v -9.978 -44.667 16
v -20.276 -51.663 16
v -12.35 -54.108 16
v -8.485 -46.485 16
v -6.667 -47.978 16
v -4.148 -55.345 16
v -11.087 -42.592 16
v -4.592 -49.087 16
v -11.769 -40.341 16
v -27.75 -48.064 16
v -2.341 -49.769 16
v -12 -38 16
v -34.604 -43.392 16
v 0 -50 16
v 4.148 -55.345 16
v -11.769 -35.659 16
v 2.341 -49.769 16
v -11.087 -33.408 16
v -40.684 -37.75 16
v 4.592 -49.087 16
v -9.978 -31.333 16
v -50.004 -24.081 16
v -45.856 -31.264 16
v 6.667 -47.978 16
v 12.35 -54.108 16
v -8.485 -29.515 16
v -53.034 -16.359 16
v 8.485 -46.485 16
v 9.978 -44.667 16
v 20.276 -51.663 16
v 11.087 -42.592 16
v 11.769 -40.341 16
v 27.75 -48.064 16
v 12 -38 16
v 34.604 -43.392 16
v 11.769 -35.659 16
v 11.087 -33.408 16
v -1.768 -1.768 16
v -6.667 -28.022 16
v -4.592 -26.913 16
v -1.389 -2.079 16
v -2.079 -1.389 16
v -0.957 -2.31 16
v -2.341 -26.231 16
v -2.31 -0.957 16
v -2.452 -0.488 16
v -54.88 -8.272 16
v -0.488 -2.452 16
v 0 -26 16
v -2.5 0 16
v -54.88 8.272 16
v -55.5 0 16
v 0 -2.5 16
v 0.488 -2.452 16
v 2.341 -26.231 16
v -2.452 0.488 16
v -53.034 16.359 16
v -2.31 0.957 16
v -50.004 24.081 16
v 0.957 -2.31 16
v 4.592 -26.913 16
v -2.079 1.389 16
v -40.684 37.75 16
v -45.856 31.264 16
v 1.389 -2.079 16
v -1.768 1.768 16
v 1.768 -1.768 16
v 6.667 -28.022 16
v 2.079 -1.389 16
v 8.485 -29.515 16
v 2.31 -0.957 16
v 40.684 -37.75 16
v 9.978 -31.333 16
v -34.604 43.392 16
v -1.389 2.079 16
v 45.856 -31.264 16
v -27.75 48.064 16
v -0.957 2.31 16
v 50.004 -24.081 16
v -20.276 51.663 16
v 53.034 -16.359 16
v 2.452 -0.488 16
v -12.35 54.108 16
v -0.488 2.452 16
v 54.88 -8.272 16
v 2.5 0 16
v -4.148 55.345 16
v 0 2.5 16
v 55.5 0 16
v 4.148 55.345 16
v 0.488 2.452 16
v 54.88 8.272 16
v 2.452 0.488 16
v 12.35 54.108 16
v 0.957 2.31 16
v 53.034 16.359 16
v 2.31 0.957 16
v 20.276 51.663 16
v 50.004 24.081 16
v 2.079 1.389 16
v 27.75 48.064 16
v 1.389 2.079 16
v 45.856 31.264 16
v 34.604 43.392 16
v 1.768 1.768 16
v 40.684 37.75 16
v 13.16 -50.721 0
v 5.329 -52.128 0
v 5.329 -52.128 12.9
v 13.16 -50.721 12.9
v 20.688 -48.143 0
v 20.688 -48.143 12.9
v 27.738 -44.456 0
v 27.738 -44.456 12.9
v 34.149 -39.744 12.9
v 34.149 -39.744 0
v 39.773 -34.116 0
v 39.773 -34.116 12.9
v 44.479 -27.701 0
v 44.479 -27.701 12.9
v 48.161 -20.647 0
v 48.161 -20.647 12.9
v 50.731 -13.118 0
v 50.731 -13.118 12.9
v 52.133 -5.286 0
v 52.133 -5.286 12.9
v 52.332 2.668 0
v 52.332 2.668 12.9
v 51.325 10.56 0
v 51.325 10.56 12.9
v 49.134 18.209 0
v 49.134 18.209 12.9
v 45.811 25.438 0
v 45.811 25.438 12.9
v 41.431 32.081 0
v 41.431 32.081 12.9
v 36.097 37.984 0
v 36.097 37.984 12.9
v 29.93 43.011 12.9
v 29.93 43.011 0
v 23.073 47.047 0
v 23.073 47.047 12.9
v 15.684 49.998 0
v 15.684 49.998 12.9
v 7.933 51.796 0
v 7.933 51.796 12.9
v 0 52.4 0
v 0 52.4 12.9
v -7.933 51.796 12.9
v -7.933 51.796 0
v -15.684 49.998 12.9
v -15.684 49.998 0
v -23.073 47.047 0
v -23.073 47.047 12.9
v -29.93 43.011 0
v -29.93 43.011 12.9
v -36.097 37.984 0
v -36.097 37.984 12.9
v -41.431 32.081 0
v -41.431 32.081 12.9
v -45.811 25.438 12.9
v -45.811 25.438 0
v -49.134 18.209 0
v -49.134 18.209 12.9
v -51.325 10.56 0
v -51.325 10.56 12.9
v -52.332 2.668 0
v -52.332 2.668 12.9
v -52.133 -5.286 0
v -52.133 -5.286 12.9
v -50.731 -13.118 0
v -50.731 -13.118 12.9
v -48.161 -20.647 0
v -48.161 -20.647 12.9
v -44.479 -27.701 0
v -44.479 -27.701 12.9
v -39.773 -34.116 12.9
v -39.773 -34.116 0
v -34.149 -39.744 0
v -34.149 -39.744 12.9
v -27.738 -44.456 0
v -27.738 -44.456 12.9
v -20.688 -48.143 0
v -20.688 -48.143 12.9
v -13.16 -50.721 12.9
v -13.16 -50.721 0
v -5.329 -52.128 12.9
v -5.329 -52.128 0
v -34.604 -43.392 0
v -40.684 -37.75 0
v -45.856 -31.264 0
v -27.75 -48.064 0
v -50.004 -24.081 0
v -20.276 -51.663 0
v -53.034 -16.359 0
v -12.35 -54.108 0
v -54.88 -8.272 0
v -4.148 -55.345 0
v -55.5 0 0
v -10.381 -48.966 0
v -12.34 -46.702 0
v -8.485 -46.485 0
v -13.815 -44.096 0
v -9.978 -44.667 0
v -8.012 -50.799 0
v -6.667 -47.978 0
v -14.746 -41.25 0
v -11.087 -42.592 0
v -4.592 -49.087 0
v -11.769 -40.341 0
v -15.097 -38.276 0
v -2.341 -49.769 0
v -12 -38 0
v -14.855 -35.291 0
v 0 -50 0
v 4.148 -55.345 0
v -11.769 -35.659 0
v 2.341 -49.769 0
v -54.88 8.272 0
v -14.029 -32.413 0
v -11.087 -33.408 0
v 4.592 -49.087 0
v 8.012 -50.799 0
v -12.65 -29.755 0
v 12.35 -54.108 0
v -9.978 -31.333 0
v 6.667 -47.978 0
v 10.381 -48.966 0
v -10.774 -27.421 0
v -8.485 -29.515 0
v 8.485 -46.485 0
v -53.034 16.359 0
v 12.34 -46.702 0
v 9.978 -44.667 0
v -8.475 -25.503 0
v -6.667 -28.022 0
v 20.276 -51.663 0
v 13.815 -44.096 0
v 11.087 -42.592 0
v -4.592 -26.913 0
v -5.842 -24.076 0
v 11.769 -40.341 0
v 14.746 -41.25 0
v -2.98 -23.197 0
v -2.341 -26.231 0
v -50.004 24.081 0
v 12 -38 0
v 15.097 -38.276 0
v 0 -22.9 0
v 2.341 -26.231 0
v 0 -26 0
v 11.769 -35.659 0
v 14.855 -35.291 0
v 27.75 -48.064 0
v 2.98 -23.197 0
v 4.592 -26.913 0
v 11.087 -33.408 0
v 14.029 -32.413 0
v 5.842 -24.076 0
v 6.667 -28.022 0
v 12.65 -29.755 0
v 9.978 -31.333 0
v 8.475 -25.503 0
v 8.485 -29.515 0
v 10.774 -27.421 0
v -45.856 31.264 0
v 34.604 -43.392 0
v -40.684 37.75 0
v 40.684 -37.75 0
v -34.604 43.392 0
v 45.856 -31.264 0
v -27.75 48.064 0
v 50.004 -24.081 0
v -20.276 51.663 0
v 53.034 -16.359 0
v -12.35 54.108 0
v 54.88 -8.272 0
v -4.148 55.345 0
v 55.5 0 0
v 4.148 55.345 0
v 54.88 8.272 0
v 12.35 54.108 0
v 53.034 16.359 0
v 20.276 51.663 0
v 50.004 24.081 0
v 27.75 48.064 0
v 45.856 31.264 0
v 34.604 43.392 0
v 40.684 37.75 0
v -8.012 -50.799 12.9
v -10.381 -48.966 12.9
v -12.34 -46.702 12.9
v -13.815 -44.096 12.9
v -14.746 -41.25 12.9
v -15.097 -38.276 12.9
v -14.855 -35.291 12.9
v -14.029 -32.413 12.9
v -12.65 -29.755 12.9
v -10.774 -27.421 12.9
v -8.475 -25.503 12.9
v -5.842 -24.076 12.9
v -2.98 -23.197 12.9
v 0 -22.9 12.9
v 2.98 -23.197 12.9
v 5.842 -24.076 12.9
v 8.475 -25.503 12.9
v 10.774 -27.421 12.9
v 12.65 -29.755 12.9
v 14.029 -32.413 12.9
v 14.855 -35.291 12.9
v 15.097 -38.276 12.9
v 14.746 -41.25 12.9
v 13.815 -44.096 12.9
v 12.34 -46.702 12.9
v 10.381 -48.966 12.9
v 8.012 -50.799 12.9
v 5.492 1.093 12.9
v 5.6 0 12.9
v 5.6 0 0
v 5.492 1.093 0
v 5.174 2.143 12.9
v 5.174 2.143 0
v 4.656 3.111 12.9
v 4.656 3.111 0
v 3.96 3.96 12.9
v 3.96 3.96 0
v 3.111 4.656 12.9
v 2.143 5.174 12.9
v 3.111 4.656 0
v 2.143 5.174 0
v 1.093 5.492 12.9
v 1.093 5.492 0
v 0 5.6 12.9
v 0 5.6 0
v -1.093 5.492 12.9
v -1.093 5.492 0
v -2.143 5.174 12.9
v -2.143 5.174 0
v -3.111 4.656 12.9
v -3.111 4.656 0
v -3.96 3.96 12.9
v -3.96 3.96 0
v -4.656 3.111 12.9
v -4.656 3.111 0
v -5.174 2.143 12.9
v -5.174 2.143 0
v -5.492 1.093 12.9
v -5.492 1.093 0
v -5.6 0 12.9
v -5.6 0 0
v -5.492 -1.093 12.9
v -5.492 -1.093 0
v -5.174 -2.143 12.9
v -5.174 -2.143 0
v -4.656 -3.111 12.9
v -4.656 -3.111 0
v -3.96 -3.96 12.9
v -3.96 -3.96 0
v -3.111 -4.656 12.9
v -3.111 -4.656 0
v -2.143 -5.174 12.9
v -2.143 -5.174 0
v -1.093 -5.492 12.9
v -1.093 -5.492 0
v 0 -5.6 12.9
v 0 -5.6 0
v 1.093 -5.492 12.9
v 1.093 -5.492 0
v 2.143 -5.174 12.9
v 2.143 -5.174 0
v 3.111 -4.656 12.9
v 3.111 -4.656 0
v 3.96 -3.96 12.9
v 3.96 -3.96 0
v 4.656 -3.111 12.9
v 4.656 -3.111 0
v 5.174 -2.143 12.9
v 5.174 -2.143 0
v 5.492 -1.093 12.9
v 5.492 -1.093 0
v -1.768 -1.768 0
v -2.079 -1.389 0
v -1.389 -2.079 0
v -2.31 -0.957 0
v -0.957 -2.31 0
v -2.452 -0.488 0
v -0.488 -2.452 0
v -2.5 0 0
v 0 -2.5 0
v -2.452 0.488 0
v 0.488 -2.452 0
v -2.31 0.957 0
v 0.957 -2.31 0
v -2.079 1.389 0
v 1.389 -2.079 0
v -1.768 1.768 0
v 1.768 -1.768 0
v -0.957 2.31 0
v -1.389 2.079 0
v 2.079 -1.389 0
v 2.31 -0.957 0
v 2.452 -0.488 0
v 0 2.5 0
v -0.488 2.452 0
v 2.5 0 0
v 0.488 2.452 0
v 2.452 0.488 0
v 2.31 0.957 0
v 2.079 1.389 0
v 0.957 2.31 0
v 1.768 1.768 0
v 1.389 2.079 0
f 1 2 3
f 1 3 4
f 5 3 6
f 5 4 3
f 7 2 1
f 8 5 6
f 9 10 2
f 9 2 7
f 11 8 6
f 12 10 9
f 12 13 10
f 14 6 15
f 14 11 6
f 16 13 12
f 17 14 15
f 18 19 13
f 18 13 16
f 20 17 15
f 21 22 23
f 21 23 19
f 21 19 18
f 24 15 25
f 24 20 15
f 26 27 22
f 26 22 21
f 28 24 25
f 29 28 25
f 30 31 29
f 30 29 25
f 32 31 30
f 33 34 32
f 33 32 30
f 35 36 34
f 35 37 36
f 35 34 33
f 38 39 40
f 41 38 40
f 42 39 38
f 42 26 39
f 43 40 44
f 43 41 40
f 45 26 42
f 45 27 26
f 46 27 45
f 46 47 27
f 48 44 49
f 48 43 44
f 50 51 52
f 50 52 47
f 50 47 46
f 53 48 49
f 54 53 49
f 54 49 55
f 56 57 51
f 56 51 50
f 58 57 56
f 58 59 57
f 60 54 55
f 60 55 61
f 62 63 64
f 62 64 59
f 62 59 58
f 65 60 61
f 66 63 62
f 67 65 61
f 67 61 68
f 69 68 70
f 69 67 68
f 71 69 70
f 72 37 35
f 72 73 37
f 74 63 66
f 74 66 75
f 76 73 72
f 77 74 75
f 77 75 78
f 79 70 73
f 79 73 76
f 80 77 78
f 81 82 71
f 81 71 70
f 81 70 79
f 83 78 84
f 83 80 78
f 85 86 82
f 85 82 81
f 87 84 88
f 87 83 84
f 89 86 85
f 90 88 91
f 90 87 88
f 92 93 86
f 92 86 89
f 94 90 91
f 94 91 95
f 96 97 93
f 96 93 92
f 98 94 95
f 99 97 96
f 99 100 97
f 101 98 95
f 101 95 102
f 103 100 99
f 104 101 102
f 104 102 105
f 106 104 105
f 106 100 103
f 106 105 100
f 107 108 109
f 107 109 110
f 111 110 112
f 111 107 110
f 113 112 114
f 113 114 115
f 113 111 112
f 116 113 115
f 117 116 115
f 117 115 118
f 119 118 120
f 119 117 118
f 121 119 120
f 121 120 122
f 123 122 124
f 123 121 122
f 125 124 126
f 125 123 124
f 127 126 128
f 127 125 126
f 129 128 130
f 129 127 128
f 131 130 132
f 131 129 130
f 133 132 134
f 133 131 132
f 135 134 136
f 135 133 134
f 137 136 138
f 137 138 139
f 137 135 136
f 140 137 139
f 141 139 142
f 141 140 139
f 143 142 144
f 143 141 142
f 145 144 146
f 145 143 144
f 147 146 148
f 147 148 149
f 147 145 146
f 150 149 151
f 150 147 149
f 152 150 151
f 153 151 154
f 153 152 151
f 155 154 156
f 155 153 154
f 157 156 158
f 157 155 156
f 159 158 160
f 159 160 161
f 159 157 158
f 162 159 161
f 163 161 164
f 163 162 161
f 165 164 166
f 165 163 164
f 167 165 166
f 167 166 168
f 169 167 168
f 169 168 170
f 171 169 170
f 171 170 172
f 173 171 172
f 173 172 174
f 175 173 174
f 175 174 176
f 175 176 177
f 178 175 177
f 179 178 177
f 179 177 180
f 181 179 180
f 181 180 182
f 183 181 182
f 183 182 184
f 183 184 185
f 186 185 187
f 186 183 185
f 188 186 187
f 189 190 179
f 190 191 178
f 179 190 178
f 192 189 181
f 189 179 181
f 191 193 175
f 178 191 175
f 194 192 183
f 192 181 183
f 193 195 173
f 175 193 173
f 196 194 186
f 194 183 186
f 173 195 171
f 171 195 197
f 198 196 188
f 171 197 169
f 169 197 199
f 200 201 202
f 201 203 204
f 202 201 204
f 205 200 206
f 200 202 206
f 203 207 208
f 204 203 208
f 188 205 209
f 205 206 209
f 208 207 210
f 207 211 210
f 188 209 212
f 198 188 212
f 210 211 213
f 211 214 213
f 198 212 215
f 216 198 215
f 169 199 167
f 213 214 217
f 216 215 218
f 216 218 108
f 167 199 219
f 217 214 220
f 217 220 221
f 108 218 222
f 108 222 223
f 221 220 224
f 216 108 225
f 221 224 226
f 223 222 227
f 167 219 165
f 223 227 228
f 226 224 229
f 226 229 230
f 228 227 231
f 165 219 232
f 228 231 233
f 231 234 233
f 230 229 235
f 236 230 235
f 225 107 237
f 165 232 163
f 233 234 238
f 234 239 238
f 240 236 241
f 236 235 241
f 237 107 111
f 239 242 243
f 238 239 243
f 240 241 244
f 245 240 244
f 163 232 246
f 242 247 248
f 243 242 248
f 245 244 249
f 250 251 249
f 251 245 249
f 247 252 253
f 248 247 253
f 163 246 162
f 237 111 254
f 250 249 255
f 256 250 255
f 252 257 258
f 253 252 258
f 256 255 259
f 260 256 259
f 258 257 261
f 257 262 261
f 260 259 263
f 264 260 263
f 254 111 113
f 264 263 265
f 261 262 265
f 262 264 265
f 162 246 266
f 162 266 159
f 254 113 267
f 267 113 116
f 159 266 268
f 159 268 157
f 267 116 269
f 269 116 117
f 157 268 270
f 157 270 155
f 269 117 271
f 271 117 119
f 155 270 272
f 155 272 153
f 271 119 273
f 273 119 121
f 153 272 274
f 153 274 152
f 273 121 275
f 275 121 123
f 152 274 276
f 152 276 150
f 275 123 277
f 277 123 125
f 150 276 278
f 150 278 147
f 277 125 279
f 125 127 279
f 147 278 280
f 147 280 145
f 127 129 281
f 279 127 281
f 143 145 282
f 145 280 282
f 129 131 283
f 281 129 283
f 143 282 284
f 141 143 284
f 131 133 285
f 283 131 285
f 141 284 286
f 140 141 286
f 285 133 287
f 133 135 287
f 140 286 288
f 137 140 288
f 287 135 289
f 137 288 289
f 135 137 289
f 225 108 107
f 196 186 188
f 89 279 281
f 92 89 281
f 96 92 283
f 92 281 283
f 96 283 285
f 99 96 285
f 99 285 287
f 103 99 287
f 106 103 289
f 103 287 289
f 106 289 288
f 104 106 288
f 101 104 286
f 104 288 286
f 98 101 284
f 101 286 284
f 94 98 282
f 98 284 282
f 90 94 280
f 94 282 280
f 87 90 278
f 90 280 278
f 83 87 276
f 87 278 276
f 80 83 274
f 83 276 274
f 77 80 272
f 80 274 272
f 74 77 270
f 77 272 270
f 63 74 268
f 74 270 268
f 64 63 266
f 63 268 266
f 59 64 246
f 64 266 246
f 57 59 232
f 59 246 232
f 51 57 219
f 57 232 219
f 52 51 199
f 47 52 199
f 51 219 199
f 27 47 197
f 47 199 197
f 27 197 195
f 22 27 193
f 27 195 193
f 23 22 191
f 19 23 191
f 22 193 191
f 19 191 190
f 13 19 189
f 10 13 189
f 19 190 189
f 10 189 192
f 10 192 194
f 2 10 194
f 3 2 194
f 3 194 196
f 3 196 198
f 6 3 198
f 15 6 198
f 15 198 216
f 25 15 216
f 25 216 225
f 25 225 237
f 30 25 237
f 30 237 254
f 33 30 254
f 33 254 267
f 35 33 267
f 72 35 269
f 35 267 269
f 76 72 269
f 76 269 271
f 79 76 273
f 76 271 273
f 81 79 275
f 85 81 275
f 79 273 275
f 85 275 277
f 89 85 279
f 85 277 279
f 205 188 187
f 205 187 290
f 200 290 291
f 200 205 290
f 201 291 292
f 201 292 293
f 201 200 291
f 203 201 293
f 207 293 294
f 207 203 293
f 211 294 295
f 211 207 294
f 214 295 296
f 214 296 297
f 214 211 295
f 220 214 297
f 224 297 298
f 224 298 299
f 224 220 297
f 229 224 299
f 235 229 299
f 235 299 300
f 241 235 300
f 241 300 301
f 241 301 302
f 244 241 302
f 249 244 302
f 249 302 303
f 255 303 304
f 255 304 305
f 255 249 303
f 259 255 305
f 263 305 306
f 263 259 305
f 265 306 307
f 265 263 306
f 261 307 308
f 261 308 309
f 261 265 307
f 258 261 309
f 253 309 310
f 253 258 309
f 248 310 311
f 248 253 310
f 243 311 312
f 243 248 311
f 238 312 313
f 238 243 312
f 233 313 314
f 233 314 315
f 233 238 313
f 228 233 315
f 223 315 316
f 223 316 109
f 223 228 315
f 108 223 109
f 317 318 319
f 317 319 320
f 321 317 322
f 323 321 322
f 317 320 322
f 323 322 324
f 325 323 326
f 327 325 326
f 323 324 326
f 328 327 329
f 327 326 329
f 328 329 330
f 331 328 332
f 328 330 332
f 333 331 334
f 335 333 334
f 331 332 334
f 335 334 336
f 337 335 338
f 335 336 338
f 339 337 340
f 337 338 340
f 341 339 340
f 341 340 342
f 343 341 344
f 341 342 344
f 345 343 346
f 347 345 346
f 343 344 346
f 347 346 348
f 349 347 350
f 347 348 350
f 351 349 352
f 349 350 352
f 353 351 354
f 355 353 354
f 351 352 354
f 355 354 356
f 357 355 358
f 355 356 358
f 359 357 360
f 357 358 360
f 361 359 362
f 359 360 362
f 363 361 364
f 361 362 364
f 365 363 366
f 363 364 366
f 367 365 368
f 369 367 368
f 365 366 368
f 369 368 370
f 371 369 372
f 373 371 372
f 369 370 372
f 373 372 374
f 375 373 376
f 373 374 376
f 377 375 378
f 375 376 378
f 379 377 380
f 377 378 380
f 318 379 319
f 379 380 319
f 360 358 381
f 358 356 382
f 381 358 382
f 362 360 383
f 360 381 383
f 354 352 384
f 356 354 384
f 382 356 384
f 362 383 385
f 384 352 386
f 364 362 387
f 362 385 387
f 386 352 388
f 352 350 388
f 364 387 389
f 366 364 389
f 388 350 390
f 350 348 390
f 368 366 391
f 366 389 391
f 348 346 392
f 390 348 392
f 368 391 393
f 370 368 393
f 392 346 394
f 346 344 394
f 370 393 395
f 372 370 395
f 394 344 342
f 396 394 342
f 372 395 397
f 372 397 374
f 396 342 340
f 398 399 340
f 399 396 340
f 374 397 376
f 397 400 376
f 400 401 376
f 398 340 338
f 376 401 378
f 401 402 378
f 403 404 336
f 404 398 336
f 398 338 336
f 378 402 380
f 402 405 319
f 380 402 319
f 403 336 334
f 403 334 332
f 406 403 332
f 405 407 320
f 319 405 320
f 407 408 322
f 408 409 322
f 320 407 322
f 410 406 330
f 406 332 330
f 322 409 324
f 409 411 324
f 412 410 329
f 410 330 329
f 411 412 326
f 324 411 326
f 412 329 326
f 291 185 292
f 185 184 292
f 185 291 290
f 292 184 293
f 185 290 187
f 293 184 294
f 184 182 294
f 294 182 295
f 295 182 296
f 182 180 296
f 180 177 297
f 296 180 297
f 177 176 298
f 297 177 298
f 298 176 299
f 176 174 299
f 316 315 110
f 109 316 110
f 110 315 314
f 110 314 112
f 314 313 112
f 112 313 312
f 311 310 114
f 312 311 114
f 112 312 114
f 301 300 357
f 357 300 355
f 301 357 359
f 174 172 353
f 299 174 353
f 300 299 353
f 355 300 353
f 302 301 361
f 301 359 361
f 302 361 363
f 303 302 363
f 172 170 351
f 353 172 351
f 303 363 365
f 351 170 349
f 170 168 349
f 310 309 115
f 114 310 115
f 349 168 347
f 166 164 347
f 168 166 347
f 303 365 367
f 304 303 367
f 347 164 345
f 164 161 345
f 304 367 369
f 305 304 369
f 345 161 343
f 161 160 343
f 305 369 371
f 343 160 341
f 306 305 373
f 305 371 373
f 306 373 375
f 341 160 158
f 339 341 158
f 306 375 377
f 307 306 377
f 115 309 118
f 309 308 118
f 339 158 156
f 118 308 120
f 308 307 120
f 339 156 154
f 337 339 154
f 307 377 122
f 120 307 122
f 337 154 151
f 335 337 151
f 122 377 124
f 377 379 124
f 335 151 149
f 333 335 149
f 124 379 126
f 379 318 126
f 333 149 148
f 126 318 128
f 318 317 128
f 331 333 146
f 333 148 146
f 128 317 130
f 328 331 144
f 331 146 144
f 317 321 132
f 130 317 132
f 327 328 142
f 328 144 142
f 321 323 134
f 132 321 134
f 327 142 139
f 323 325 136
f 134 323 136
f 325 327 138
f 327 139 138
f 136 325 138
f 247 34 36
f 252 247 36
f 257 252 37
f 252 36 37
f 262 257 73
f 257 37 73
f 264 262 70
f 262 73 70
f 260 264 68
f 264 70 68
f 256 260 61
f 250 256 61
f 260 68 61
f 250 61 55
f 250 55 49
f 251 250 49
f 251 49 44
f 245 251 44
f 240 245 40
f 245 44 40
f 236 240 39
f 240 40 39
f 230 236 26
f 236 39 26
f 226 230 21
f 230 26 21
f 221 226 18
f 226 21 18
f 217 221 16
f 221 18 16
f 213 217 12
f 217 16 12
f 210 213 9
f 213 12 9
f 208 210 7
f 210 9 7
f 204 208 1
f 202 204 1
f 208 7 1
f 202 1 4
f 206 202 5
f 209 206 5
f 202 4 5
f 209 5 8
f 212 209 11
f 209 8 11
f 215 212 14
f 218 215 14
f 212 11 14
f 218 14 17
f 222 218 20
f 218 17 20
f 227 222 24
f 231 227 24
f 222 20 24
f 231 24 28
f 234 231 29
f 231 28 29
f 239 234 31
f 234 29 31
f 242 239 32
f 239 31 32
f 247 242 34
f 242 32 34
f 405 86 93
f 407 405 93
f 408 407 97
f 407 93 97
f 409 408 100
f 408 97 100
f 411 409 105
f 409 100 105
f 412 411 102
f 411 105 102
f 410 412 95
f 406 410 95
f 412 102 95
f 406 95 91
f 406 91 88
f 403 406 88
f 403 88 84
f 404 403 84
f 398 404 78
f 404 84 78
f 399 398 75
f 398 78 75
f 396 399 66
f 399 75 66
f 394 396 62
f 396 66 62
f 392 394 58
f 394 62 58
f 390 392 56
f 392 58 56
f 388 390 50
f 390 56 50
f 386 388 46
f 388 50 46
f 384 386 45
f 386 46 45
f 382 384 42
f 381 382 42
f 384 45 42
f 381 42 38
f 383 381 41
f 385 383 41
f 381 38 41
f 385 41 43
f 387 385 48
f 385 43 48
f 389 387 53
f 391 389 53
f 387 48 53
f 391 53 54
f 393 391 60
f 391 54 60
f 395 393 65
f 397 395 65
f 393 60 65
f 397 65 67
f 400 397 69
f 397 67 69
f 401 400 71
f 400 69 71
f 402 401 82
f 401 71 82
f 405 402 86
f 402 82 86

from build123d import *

# Parameters (mm, degrees)
SKETCH1_R           = 55.5
BOSS_EXTRUDE1_DEPTH = 16
SKETCH2_R           = 12
CUT_EXTRUDE1_DEPTH  = 16
SKETCH3_R           = 2.5
CUT_EXTRUDE2_DEPTH  = 16
SHELL2_OUTLINE_R    = 5.6
SHELL2_DEPTH        = 12.9


# Read off the part's stored shape, not the designer's step: Shell2
with BuildPart() as part:
    # Sketch1 → Boss-Extrude1 (new body)
    with BuildSketch(Plane.XY):
        Circle(SKETCH1_R)
    extrude(amount=BOSS_EXTRUDE1_DEPTH)

    # Sketch2 → Cut-Extrude1 (cut)
    with BuildSketch(Plane.XY.offset(16)):
        with Locations((0, -38)):
            Circle(SKETCH2_R)
    extrude(amount=-CUT_EXTRUDE1_DEPTH, mode=Mode.SUBTRACT)

    # Sketch3 → Cut-Extrude2 (cut)
    with BuildSketch(Plane.XY.offset(16)):
        Circle(SKETCH3_R)
    extrude(amount=-CUT_EXTRUDE2_DEPTH, mode=Mode.SUBTRACT)

    # Shell2 outline → Shell2 (cut)
    with BuildSketch(Plane.XY):
        with BuildLine():
            ThreePointArc((5.329299818, -52.128289474), (0, 52.4), (-5.329299818, -52.128289474))
            ThreePointArc((-5.329299818, -52.128289474), (0, -22.9), (5.329299818, -52.128289474))
        make_face()
        Circle(SHELL2_OUTLINE_R, mode=Mode.SUBTRACT)
    extrude(amount=SHELL2_DEPTH, mode=Mode.SUBTRACT)


solid = part.part
